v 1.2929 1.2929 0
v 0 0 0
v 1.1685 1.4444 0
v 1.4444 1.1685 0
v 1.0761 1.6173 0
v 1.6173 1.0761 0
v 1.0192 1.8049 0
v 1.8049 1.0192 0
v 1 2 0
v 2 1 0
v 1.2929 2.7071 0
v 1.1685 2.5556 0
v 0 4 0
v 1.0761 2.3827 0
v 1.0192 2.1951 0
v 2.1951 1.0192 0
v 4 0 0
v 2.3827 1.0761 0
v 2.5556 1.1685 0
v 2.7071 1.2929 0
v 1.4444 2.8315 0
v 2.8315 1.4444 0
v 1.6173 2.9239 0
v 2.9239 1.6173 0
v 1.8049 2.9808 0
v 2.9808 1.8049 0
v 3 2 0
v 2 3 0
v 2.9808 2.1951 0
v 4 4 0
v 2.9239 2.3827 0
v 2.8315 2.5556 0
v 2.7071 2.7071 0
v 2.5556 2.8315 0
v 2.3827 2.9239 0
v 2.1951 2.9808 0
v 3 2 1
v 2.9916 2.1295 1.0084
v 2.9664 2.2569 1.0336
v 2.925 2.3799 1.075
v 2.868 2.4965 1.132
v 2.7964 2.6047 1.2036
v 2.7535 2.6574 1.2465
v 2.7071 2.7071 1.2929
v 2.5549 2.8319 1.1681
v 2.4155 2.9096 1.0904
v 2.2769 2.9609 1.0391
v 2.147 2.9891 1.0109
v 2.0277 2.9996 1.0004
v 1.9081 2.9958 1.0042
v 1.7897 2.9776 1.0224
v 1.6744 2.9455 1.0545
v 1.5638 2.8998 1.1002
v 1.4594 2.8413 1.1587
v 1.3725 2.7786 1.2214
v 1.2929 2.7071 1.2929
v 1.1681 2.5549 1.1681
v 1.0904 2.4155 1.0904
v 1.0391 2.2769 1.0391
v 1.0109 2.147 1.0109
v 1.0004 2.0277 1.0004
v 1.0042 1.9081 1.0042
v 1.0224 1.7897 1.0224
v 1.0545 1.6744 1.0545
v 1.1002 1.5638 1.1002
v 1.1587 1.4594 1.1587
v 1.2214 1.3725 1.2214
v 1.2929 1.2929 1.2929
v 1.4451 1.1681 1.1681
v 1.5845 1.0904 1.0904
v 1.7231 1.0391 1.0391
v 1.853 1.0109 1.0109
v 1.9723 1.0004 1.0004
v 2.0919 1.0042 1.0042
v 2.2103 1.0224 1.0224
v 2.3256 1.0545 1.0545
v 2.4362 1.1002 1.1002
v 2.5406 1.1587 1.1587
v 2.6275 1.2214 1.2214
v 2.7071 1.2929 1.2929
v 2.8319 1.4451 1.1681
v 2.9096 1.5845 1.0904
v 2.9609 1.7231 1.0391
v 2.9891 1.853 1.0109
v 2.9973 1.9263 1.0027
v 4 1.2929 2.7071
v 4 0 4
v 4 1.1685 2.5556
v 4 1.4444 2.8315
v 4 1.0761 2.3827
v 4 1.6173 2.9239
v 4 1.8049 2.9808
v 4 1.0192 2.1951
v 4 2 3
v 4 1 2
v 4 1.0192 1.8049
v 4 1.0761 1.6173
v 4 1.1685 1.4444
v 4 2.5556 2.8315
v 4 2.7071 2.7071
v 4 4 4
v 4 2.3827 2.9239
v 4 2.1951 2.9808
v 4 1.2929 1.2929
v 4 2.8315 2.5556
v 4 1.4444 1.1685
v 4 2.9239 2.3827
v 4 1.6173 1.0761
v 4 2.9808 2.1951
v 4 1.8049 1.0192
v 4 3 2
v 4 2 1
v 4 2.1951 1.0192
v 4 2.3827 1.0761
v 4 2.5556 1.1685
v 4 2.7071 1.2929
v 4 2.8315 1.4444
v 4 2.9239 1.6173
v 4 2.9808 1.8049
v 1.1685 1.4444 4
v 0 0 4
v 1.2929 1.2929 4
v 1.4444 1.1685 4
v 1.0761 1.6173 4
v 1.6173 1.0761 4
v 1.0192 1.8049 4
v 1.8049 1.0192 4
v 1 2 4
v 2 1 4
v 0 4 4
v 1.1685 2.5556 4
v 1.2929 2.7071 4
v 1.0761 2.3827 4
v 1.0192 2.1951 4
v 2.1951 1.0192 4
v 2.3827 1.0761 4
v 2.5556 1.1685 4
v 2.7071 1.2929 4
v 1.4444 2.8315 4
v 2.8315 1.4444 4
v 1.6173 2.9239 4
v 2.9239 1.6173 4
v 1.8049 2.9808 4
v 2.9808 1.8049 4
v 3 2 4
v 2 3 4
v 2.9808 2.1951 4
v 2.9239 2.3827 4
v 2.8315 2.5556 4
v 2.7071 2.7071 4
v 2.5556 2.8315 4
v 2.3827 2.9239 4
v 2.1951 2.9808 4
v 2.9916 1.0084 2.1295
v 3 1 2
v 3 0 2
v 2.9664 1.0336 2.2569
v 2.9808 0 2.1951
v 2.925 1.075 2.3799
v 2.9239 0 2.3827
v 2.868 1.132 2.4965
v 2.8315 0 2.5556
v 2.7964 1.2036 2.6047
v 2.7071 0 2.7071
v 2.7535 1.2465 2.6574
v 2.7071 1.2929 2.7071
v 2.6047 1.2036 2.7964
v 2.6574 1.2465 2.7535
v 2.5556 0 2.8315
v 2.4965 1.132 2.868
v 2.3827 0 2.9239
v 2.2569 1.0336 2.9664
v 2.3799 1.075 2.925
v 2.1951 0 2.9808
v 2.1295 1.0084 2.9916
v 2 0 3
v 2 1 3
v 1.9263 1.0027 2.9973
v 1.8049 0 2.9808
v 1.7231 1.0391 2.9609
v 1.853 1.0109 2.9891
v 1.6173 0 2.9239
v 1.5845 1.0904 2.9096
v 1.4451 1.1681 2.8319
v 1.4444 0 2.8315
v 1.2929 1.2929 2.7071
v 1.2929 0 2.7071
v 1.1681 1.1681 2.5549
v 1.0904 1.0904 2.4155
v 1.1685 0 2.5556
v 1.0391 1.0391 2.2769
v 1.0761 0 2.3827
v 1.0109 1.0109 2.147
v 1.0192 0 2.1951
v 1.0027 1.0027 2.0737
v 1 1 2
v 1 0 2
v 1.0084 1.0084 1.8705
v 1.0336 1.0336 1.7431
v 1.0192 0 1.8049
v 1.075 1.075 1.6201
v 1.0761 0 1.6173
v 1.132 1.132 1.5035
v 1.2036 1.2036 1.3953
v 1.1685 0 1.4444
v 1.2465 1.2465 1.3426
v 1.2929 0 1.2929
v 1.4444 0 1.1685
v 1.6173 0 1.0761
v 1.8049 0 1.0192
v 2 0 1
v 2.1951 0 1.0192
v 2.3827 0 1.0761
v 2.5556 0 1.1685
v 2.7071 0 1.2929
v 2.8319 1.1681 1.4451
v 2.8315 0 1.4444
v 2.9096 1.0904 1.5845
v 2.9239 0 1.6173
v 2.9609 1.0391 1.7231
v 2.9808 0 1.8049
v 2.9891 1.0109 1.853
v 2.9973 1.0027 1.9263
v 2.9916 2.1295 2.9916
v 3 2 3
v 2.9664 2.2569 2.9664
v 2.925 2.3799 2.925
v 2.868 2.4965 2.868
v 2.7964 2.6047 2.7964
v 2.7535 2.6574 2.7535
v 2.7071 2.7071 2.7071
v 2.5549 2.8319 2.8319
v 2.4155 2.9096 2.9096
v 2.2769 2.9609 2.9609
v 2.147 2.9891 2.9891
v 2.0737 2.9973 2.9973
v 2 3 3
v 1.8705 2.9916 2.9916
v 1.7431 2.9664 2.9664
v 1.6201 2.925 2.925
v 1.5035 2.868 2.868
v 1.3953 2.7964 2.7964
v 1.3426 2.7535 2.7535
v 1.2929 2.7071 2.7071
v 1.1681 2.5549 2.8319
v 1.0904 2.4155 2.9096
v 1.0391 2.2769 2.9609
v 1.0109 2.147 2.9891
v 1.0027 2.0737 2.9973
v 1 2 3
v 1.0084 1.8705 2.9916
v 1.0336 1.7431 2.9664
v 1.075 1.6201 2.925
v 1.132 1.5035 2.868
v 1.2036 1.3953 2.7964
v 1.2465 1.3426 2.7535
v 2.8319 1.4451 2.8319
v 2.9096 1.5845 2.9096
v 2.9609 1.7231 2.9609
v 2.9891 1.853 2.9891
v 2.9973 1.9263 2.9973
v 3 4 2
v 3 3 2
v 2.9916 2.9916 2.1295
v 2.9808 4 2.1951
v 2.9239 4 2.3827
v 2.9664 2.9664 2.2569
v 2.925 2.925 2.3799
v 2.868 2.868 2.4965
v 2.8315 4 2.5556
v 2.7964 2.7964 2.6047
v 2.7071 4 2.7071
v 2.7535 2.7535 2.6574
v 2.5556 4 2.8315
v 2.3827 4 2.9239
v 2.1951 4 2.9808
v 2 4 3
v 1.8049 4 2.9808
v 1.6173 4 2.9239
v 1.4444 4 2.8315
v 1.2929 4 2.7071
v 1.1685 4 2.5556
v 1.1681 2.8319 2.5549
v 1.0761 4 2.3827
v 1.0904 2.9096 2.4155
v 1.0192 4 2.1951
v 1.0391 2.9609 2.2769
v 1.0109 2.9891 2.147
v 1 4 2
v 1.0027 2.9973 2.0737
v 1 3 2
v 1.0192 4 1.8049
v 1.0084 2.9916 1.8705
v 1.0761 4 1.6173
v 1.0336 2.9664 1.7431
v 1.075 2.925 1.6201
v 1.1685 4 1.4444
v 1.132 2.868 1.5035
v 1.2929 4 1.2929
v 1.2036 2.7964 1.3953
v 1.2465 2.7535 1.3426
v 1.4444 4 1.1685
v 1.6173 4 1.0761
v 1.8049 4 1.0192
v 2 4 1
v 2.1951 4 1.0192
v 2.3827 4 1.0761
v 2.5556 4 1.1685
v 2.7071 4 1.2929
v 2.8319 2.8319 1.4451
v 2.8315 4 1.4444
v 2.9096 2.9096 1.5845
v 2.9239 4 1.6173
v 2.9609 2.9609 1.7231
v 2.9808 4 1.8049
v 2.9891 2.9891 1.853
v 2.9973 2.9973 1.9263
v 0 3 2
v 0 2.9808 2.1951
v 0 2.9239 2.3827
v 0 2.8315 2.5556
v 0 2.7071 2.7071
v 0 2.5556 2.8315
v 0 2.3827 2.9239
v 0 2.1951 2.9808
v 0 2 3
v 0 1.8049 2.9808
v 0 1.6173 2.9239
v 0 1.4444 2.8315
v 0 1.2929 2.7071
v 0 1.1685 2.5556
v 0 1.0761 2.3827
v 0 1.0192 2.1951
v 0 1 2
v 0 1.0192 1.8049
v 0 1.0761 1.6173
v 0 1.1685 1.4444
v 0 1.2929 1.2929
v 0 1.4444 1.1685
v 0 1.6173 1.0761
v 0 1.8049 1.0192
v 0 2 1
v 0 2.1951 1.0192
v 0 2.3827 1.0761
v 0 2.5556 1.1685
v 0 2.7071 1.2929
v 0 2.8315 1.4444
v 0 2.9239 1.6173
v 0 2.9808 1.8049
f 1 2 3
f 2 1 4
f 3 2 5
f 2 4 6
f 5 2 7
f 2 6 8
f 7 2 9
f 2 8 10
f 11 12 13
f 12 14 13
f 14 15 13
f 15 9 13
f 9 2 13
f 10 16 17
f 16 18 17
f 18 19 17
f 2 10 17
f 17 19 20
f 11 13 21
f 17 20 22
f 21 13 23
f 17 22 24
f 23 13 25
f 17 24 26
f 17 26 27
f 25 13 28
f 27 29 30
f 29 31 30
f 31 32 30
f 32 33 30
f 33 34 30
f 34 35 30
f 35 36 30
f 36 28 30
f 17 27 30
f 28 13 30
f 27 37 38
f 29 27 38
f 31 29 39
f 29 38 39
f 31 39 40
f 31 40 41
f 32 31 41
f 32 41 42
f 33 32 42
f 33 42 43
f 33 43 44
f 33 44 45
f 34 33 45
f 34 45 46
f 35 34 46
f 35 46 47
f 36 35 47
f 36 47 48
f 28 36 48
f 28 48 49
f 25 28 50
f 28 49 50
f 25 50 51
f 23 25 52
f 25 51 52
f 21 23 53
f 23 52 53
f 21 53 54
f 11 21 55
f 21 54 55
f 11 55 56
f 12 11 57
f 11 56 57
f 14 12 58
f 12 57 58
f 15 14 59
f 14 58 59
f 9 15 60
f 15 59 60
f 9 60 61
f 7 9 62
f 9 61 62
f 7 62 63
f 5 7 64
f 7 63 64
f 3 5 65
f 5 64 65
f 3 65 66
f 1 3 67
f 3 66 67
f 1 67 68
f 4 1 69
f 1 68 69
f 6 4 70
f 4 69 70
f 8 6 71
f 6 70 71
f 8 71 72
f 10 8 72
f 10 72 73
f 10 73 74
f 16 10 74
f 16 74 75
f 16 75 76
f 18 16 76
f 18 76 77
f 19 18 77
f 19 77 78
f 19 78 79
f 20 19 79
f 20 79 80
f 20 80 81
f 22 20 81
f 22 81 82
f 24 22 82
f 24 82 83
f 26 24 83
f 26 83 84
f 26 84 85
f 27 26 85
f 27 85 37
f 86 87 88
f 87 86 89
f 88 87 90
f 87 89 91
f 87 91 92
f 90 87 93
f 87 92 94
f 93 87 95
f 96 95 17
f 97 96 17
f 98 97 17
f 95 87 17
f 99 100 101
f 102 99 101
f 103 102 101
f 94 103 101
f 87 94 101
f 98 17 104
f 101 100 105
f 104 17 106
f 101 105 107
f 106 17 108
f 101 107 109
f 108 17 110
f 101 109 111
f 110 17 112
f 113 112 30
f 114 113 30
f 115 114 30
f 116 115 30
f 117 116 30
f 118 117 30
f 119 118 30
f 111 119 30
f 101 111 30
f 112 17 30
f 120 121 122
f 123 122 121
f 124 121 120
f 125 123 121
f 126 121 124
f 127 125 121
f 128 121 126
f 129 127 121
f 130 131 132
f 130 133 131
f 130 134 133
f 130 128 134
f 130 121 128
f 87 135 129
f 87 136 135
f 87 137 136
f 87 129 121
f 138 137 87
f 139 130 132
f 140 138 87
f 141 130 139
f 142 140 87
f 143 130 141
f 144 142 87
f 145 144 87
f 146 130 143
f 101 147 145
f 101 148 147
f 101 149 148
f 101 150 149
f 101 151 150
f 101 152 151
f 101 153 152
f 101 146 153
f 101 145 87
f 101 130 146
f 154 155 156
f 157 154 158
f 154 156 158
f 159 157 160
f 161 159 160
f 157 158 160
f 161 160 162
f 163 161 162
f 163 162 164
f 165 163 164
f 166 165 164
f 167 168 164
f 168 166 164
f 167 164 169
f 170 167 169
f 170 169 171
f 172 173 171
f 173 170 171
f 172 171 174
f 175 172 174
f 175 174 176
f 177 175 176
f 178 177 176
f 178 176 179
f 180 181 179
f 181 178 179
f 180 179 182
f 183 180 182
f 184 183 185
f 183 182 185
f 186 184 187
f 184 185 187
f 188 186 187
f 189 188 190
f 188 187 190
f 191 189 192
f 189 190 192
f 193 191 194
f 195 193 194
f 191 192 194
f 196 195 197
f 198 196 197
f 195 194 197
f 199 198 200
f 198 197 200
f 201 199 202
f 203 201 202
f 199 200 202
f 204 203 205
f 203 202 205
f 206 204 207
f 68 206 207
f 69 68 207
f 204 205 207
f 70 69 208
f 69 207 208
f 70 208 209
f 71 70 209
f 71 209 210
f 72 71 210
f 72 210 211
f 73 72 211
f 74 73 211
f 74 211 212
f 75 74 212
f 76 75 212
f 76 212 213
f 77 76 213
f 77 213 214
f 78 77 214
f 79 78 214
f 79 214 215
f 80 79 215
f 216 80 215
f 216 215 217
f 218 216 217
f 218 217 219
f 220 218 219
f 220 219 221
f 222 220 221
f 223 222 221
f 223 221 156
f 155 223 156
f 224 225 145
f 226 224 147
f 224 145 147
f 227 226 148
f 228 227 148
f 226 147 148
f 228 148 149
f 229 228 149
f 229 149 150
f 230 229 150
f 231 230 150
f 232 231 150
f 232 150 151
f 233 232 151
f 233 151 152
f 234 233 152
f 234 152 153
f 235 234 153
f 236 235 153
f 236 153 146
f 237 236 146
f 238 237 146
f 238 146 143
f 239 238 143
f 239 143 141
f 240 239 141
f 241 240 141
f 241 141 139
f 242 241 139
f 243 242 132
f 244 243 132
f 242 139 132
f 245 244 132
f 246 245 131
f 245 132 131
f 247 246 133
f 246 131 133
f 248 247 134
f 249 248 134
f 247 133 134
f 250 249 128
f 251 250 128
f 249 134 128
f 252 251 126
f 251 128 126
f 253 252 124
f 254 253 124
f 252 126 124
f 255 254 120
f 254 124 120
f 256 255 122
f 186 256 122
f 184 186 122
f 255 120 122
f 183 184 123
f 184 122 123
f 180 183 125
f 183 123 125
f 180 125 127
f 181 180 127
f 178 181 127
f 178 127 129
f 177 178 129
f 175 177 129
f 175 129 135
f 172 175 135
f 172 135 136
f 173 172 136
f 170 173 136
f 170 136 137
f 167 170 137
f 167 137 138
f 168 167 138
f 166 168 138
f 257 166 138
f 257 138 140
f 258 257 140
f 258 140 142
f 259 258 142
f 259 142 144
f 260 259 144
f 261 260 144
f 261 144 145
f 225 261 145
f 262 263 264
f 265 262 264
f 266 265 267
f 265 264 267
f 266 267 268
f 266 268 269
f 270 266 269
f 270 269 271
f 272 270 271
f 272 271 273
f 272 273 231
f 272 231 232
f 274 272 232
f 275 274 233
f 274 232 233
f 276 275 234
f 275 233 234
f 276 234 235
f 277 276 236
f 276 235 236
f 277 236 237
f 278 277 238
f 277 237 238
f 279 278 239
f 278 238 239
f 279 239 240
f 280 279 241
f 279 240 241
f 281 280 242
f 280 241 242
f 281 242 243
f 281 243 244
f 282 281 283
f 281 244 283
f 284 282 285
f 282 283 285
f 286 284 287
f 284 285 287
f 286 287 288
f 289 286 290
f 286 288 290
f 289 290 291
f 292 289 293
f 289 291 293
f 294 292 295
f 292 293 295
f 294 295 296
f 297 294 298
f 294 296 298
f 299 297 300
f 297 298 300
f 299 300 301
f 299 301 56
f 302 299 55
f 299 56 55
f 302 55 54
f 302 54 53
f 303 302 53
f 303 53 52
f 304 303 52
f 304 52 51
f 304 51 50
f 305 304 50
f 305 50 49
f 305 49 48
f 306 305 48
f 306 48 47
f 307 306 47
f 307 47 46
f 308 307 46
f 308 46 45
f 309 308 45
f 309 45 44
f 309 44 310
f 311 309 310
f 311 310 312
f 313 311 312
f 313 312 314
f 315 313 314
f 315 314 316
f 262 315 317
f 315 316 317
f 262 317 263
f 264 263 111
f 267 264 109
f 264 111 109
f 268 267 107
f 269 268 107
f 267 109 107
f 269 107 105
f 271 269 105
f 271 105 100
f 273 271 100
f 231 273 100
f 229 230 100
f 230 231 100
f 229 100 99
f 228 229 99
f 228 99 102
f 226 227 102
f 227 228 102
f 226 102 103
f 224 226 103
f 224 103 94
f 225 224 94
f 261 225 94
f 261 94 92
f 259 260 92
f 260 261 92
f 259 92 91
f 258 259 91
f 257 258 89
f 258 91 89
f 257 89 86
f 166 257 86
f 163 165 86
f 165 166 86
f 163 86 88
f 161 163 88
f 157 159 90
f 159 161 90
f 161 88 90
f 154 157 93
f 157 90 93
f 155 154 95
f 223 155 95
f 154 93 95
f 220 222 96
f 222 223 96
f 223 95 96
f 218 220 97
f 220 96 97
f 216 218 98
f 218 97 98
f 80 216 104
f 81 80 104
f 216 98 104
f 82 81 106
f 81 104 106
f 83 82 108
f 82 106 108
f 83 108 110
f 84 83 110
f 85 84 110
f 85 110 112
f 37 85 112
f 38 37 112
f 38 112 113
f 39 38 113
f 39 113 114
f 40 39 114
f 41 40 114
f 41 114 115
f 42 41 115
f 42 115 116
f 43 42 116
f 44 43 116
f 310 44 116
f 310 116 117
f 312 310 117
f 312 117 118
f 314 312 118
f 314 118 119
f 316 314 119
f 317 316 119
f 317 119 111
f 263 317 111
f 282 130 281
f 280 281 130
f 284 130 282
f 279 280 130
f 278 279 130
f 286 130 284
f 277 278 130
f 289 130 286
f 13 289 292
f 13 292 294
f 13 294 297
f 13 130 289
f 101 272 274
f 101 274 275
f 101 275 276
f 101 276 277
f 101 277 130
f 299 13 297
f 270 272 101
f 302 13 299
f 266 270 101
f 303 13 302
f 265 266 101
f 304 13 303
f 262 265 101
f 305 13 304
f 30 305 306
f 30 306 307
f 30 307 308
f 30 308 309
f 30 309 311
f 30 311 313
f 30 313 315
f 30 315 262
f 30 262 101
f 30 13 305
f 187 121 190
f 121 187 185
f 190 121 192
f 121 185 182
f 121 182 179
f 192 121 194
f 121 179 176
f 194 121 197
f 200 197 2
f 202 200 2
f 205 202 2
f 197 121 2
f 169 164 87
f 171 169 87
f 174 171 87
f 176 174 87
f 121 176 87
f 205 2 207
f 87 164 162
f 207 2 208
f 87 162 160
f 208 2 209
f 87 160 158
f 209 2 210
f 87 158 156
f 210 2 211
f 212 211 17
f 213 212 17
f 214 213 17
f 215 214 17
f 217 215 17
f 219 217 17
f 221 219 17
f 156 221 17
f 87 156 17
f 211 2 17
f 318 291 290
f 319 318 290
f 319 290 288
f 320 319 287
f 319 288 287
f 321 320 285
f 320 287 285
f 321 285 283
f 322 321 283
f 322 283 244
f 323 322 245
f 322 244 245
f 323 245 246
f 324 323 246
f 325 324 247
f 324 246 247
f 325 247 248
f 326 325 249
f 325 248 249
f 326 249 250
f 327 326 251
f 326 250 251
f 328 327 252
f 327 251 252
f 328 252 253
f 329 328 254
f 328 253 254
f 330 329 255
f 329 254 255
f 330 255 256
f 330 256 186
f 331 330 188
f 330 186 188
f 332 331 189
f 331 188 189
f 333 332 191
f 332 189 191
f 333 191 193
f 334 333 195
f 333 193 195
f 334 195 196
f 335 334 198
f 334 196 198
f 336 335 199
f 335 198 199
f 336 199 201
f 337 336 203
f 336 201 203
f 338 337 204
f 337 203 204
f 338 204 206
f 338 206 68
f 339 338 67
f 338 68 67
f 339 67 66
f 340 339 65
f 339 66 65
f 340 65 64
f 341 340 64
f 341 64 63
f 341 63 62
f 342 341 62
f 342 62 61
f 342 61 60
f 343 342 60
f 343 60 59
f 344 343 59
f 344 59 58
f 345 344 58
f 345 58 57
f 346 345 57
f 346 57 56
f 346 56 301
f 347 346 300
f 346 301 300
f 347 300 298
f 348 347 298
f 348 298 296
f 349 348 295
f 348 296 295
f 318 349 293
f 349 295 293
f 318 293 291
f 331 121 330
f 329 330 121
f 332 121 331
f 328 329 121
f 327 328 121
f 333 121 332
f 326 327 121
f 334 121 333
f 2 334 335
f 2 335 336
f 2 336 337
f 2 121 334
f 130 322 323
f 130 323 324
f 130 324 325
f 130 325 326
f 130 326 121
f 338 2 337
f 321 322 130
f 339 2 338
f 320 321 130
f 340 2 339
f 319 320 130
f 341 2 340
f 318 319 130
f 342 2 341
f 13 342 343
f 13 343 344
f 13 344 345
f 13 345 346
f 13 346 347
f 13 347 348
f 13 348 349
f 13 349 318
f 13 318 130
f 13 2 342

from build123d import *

# Parameters (mm, degrees)
F0_W     = 4
F0_H     = 4
F1_DEPTH = 4
F2_R     = 1
F4_DEPTH = 25
F5_R     = 1
F6_DEPTH = 25
F7_R     = 1
F8_DEPTH = 25


with BuildPart() as f1:
    # F0 (on Top) → F1 (new body)
    with BuildSketch(Plane.XY):
        with Locations((2, 2)):
            Rectangle(F0_W, F0_H)
    extrude(amount=F1_DEPTH)

    # F2 (on face) → F4 (cut)
    with BuildSketch(Plane.XY.offset(4)):
        with Locations((2, 2)):
            Circle(F2_R)
    extrude(amount=-F4_DEPTH, mode=Mode.SUBTRACT)

    # F5 (on face) → F6 (cut)
    with BuildSketch(Plane.XZ):
        with Locations((2, 2)):
            Circle(F5_R)
    extrude(amount=-F6_DEPTH, mode=Mode.SUBTRACT)

    # F7 (on face) → F8 (cut)
    with BuildSketch(Plane.YZ.offset(4)):
        with Locations((2, 2)):
            Circle(F7_R)
    extrude(amount=-F8_DEPTH, mode=Mode.SUBTRACT)


solid = f1.part
